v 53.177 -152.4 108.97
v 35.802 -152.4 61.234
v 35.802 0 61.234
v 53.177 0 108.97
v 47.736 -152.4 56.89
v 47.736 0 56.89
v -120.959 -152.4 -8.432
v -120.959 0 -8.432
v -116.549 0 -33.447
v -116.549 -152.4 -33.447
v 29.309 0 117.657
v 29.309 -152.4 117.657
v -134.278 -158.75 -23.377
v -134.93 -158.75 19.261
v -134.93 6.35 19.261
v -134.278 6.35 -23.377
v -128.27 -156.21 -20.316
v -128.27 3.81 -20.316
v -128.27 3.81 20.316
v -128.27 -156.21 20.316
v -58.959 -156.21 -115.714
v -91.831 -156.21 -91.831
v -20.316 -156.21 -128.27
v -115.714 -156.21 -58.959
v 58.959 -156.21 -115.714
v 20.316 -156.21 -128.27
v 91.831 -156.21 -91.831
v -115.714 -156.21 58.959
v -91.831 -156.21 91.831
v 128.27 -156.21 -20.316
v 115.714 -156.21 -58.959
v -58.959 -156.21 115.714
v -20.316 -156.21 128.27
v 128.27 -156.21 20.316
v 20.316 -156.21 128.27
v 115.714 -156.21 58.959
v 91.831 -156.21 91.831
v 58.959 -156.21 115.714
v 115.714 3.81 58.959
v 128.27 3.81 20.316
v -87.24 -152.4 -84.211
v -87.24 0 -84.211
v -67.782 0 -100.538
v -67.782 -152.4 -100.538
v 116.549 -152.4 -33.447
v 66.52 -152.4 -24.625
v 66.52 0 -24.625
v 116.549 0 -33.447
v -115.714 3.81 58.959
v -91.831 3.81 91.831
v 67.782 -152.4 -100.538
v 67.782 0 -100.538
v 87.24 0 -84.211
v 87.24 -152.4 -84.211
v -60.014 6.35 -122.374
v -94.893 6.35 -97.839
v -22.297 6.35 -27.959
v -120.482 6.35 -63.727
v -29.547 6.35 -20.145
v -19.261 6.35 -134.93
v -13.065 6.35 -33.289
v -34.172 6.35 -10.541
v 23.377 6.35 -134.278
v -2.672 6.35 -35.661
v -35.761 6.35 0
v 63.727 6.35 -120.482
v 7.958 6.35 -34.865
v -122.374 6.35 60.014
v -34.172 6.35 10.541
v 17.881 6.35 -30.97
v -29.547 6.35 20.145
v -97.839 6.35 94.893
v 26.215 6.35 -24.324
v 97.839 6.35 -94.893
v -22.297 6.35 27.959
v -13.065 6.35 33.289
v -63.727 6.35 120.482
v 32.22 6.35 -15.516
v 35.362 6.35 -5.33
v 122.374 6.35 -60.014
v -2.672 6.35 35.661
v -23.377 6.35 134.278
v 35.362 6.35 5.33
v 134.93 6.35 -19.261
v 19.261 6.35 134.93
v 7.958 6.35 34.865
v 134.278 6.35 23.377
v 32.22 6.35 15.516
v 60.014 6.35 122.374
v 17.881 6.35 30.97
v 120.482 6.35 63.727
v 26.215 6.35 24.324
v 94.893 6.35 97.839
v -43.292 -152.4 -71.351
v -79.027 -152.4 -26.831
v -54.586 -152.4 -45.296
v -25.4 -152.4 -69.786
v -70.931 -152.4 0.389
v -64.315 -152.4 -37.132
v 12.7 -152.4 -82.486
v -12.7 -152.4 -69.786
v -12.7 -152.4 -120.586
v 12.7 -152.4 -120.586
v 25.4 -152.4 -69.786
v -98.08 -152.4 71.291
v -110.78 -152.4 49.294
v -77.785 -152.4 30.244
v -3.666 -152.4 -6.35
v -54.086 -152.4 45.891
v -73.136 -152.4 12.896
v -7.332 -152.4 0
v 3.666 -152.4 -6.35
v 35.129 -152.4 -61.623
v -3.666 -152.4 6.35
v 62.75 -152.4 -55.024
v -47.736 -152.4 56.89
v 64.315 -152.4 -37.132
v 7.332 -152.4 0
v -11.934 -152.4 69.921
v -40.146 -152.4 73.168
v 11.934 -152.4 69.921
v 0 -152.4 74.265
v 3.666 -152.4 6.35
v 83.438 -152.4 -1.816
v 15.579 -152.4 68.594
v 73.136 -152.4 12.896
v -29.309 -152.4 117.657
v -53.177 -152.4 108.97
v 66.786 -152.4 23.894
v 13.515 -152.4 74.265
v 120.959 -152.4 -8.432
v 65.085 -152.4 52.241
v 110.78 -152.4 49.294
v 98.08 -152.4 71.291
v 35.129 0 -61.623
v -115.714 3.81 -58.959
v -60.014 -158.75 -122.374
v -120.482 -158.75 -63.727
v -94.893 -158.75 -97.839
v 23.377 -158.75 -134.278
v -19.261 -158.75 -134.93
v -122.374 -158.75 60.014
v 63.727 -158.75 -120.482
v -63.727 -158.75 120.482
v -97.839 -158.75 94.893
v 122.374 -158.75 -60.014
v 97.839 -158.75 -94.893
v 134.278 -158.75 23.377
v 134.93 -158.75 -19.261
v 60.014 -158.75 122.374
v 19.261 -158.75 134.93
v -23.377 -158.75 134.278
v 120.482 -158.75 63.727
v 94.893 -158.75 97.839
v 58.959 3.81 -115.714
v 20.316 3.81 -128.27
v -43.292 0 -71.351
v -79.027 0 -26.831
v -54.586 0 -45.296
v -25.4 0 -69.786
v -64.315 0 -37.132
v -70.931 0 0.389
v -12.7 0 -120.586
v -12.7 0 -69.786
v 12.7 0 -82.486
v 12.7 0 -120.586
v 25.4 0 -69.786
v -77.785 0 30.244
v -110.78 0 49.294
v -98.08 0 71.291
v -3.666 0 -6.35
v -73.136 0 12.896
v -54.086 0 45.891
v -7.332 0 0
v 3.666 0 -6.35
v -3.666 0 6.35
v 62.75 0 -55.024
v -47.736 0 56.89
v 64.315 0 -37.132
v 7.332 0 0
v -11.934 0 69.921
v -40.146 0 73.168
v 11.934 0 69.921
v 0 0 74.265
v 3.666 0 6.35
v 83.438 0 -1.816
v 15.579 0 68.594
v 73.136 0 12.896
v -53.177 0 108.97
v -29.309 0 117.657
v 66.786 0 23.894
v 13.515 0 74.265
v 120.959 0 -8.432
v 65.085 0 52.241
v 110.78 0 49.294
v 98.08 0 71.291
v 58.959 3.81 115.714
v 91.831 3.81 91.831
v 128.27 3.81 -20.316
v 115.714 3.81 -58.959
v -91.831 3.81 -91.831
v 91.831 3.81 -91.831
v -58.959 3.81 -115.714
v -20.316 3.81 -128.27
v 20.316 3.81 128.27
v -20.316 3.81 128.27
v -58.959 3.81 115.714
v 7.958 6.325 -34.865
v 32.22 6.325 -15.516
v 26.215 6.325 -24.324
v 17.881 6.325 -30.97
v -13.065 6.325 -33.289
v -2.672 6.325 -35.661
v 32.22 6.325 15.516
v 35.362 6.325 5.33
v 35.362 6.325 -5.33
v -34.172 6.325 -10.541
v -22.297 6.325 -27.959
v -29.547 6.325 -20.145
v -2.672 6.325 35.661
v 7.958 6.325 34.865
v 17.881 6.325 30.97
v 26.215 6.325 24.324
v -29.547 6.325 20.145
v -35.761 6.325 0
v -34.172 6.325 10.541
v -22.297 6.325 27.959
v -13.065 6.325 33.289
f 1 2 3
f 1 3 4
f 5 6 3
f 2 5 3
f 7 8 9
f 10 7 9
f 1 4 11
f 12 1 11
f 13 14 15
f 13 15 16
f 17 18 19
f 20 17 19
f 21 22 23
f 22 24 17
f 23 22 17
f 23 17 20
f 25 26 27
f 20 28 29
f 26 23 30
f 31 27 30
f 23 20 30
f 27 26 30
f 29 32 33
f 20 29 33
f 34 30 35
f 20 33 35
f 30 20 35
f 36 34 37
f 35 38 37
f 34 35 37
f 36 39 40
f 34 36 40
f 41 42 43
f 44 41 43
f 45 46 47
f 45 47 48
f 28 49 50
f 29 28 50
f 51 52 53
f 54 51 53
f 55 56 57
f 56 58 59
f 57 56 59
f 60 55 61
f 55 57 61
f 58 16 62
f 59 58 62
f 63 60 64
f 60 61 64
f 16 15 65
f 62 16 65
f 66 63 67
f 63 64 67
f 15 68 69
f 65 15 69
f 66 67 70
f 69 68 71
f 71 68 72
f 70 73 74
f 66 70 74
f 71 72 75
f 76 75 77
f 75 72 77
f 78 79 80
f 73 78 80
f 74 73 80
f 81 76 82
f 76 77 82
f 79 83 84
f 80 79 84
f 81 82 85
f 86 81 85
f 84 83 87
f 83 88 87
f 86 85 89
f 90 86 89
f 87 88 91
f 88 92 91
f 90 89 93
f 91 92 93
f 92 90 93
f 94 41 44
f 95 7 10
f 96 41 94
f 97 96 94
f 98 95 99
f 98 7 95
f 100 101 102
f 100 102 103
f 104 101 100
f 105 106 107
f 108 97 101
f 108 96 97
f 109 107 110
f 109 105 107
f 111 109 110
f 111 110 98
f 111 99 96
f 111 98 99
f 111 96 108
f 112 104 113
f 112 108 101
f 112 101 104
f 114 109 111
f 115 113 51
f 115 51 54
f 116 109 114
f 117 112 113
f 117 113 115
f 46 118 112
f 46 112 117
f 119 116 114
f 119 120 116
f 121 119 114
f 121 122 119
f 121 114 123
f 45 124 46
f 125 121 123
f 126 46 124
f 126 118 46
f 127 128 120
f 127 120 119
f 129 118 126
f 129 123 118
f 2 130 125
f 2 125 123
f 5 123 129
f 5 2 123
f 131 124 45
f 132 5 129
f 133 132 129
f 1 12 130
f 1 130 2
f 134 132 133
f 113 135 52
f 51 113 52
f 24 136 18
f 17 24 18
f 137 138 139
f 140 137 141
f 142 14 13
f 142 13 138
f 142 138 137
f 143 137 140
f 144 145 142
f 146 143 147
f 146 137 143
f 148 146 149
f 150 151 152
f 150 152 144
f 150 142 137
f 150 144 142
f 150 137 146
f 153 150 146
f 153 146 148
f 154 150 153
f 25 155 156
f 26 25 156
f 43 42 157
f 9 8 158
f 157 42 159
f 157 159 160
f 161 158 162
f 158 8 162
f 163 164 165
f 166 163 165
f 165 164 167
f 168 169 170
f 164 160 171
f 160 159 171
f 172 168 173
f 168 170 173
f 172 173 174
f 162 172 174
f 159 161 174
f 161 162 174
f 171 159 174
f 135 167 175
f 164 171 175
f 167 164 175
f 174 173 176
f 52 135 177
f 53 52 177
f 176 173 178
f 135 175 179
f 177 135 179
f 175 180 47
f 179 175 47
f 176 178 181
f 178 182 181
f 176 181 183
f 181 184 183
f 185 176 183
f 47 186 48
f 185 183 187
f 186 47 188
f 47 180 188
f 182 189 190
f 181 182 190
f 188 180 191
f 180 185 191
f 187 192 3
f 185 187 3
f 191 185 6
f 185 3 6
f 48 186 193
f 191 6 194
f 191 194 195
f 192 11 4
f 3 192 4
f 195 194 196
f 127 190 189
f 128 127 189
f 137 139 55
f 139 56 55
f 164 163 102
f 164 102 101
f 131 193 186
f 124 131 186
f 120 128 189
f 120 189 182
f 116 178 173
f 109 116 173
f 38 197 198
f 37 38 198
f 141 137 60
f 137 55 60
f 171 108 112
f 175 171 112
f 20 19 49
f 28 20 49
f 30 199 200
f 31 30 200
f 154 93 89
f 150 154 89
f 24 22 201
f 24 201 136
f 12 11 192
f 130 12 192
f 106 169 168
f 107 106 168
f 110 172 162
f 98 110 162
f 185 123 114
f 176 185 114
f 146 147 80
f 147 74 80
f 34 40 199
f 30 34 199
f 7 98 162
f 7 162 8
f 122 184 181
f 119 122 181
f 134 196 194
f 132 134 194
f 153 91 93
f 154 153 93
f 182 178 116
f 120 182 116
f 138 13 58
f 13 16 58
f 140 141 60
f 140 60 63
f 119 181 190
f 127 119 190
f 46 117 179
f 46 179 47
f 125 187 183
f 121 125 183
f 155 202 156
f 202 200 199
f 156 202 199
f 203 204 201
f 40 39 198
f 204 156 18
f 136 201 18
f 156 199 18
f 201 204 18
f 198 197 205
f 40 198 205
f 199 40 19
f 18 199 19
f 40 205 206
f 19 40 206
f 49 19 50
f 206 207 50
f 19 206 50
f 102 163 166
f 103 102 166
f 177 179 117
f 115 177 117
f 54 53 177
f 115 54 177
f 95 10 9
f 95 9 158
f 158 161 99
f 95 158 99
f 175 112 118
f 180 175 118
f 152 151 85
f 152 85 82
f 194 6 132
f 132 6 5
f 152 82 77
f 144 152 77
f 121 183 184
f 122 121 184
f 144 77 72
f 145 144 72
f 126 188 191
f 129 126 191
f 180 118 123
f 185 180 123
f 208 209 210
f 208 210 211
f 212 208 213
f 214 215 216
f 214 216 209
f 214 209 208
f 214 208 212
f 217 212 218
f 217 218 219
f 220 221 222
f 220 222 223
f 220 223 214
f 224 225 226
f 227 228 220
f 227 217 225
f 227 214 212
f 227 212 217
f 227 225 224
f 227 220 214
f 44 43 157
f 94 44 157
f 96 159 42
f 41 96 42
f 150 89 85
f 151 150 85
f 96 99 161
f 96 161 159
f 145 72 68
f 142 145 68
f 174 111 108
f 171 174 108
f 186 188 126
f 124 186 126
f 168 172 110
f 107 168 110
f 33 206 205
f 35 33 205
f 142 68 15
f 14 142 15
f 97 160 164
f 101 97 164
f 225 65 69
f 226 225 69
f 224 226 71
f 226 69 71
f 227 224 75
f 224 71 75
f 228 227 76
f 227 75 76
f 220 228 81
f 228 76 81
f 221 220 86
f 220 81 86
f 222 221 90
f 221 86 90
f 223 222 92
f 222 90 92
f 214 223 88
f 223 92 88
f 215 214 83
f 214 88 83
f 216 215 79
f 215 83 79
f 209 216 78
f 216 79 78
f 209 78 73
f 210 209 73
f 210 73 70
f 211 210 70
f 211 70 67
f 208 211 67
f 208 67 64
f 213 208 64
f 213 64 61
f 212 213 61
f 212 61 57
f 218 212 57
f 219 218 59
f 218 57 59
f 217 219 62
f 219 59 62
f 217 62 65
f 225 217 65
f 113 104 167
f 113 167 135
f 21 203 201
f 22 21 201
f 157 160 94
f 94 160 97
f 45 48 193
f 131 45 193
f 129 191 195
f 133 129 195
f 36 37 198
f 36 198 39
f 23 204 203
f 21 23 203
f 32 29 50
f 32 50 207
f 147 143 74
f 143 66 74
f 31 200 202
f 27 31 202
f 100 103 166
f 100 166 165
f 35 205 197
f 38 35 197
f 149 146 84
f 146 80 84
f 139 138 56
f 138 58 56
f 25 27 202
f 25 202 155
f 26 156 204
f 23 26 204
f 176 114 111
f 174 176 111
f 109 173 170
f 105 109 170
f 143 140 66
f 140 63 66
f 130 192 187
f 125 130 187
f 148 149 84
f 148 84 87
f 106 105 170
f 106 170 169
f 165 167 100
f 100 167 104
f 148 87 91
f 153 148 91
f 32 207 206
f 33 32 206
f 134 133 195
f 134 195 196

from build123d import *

# Parameters (mm, degrees)
F0_W          = 25.4
F0_H          = 50.8
F1_DEPTH      = 152.4
F2_SIZE       = 12.69999
F4_DEPTH      = 152.401
F6_DEPTH      = 158.75
F6_DEPTH_BACK = 6.35
F7_R          = 129.8689016848
F8_DEPTH      = 2.54
F9_R          = 129.8689016848
F10_DEPTH     = 2.54
F11_R         = 35.7612009526
F12_DEPTH     = 0.0254


# Not quite as in the source:
# - a fillet or chamfer is up to 0.001 mm smaller than in the source, because OpenCascade refuses the exact size


with BuildPart() as f1:
    # F0 (on Front) → F1 (new body)
    with BuildSketch(Plane.XZ):
        Polygon((12.7, -69.7859264541), (25.4, -69.7859264541), (35.1287644276, -61.6225238111), (54.5862932828, -45.2957185251), (64.3150577104, -37.1323158821), (66.5203895668, -24.6252574188), (70.9310532796, 0.3888595077), (73.1363851359, 12.8959179709), (66.7863851359, 23.894440599), (54.0863851359, 45.8914858551), (47.7363851359, 56.8900084832), (35.8022888519, 61.2336643034), (15.5788562807, 68.5943917941), (11.934096284, 69.9209759439), (0, 74.2646317641), (-11.934096284, 69.9209759439), (-35.8022888519, 61.2336643034), (-47.7363851359, 56.8900084832), (-54.0863851359, 45.8914858551), (-66.7863851359, 23.894440599), (-73.1363851359, 12.8959179709), (-70.9310532796, 0.3888595077), (-66.5203895668, -24.6252574188), (-64.3150577104, -37.1323158821), (-54.5862932828, -45.2957185251), (-35.1287644276, -61.6225238111), (-25.4, -69.7859264541), (-12.7, -69.7859264541), align=None)
        Polygon((-110.7804756482, 49.294440599), (-66.7863851359, 23.894440599), (-54.0863851359, 45.8914858551), (-98.0804756482, 71.2914858551), align=None)
        Polygon((-53.1769121329, 108.9700494394), (-35.8022888519, 61.2336643034), (-11.934096284, 69.9209759439), (-29.3087195649, 117.6573610798), align=None)
        Polygon((15.5788562807, 68.5943917941), (35.8022888519, 61.2336643034), (53.1769121329, 108.9700494394), (29.3087195649, 117.6573610798), (13.5150577104, 74.2646317641), align=None)
        Polygon((54.0863851359, 45.8914858551), (66.7863851359, 23.894440599), (110.7804756482, 49.294440599), (98.0804756482, 71.2914858551), align=None)
        Polygon((70.9310532796, 0.3888595077), (66.5203895668, -24.6252574188), (116.5486234198, -33.4465848443), (120.9592871326, -8.4324679178), align=None)
        Polygon((54.5862932828, -45.2957185251), (35.1287644276, -61.6225238111), (67.7823749997, -100.5375815216), (87.2399038549, -84.2107762355), align=None)
        with Locations((0, -95.1859264541)):
            Rectangle(F0_W, F0_H)
        Polygon((-67.7823749997, -100.5375815216), (-35.1287644276, -61.6225238111), (-54.5862932828, -45.2957185251), (-87.2399038549, -84.2107762355), align=None)
        Polygon((-116.5486234198, -33.4465848443), (-66.5203895668, -24.6252574188), (-70.9310532796, 0.3888595077), (-120.9592871326, -8.4324679178), align=None)
    extrude(amount=F1_DEPTH)

    # F2 (size 12.7 in the source; OpenCascade refuses exactly that, so slightly less here)
    f2_edges = [f1.edges().sort_by_distance(p)[0] for p in [
        (54.086385, -76.2, 45.891486),
        (12.7, -76.2, -69.785926),
        (-66.786385, -76.2, 23.894441),
        (54.586293, -76.2, -45.295719),
        (-35.802289, -76.2, 61.233664),
        (-66.52039, -76.2, -24.625257),
        (70.931053, -76.2, 0.38886),
        (-35.128764, -76.2, -61.622524),
    ]]
    chamfer(f2_edges, length=F2_SIZE)

    # F3 (on face) → F4 (cut, through all)
    with BuildSketch(Plane.XZ.offset(152.4)):
        Polygon((-3.6661742094, -6.35), (3.6661742094, -6.35), (7.3323484187, 0), (3.6661742094, 6.35), (-3.6661742094, 6.35), (-7.3323484187, 0), align=None)
    extrude(amount=-F4_DEPTH, mode=Mode.SUBTRACT)


with BuildPart() as f6:
    # F5 (on face) → F6 (new body, two sides)
    with BuildSketch(Plane.XZ.offset(152.4)) as f6_sk:
        Polygon((-122.3742804365, 60.0141262379), (-134.9302417462, 19.261093499), (-134.2782908794, -23.3773492715), (-120.4822453295, -63.7274542157), (-94.8925581576, -97.839471926), (-60.0141262379, -122.3742804365), (-19.261093499, -134.9302417462), (23.3773492715, -134.2782908794), (63.7274542157, -120.4822453295), (97.839471926, -94.8925581576), (122.3742804365, -60.0141262379), (134.9302417462, -19.261093499), (134.2782908794, 23.3773492715), (120.4822453295, 63.7274542157), (94.8925581576, 97.839471926), (60.0141262379, 122.3742804365), (19.261093499, 134.9302417462), (-23.3773492715, 134.2782908794), (-63.7274542157, 120.4822453295), (-97.839471926, 94.8925581576), align=None)
        Polygon((58.9592475765, -115.7140386904), (20.3159721604, -128.27), (-20.3159721604, -128.27), (-58.9592475765, -115.7140386904), (-91.8311810466, -91.8311810466), (-115.7140386904, -58.9592475765), (-128.27, -20.3159721604), (-128.27, 20.3159721604), (-115.7140386904, 58.9592475765), (-91.8311810466, 91.8311810466), (-58.9592475765, 115.7140386904), (-20.3159721604, 128.27), (20.3159721604, 128.27), (58.9592475765, 115.7140386904), (91.8311810466, 91.8311810466), (115.7140386904, 58.9592475765), (128.27, 20.3159721604), (128.27, -20.3159721604), (115.7140386904, -58.9592475765), (91.8311810466, -91.8311810466), align=None, mode=Mode.SUBTRACT)
    extrude(amount=-F6_DEPTH)
    extrude(f6_sk.sketch, amount=F6_DEPTH_BACK)

    # F7 (on face) → F8 (join)
    with BuildSketch(Plane.XZ.offset(158.75)):
        Circle(F7_R)
    extrude(amount=-F8_DEPTH)

    # F9 (on face) → F10 (join)
    with BuildSketch(Plane(origin=(0, 6.35, 0), x_dir=(-1, 0, 0), z_dir=(0, 1, 0))):
        Circle(F9_R)
    extrude(amount=-F10_DEPTH)

    # F11 (on face) → F12 (cut)
    with BuildSketch(Plane(origin=(0, 6.35, 0), x_dir=(-1, 0, 0), z_dir=(0, 1, 0))):
        Circle(F11_R)
    extrude(amount=-F12_DEPTH, mode=Mode.SUBTRACT)


solid = Compound([f1.part, f6.part])
